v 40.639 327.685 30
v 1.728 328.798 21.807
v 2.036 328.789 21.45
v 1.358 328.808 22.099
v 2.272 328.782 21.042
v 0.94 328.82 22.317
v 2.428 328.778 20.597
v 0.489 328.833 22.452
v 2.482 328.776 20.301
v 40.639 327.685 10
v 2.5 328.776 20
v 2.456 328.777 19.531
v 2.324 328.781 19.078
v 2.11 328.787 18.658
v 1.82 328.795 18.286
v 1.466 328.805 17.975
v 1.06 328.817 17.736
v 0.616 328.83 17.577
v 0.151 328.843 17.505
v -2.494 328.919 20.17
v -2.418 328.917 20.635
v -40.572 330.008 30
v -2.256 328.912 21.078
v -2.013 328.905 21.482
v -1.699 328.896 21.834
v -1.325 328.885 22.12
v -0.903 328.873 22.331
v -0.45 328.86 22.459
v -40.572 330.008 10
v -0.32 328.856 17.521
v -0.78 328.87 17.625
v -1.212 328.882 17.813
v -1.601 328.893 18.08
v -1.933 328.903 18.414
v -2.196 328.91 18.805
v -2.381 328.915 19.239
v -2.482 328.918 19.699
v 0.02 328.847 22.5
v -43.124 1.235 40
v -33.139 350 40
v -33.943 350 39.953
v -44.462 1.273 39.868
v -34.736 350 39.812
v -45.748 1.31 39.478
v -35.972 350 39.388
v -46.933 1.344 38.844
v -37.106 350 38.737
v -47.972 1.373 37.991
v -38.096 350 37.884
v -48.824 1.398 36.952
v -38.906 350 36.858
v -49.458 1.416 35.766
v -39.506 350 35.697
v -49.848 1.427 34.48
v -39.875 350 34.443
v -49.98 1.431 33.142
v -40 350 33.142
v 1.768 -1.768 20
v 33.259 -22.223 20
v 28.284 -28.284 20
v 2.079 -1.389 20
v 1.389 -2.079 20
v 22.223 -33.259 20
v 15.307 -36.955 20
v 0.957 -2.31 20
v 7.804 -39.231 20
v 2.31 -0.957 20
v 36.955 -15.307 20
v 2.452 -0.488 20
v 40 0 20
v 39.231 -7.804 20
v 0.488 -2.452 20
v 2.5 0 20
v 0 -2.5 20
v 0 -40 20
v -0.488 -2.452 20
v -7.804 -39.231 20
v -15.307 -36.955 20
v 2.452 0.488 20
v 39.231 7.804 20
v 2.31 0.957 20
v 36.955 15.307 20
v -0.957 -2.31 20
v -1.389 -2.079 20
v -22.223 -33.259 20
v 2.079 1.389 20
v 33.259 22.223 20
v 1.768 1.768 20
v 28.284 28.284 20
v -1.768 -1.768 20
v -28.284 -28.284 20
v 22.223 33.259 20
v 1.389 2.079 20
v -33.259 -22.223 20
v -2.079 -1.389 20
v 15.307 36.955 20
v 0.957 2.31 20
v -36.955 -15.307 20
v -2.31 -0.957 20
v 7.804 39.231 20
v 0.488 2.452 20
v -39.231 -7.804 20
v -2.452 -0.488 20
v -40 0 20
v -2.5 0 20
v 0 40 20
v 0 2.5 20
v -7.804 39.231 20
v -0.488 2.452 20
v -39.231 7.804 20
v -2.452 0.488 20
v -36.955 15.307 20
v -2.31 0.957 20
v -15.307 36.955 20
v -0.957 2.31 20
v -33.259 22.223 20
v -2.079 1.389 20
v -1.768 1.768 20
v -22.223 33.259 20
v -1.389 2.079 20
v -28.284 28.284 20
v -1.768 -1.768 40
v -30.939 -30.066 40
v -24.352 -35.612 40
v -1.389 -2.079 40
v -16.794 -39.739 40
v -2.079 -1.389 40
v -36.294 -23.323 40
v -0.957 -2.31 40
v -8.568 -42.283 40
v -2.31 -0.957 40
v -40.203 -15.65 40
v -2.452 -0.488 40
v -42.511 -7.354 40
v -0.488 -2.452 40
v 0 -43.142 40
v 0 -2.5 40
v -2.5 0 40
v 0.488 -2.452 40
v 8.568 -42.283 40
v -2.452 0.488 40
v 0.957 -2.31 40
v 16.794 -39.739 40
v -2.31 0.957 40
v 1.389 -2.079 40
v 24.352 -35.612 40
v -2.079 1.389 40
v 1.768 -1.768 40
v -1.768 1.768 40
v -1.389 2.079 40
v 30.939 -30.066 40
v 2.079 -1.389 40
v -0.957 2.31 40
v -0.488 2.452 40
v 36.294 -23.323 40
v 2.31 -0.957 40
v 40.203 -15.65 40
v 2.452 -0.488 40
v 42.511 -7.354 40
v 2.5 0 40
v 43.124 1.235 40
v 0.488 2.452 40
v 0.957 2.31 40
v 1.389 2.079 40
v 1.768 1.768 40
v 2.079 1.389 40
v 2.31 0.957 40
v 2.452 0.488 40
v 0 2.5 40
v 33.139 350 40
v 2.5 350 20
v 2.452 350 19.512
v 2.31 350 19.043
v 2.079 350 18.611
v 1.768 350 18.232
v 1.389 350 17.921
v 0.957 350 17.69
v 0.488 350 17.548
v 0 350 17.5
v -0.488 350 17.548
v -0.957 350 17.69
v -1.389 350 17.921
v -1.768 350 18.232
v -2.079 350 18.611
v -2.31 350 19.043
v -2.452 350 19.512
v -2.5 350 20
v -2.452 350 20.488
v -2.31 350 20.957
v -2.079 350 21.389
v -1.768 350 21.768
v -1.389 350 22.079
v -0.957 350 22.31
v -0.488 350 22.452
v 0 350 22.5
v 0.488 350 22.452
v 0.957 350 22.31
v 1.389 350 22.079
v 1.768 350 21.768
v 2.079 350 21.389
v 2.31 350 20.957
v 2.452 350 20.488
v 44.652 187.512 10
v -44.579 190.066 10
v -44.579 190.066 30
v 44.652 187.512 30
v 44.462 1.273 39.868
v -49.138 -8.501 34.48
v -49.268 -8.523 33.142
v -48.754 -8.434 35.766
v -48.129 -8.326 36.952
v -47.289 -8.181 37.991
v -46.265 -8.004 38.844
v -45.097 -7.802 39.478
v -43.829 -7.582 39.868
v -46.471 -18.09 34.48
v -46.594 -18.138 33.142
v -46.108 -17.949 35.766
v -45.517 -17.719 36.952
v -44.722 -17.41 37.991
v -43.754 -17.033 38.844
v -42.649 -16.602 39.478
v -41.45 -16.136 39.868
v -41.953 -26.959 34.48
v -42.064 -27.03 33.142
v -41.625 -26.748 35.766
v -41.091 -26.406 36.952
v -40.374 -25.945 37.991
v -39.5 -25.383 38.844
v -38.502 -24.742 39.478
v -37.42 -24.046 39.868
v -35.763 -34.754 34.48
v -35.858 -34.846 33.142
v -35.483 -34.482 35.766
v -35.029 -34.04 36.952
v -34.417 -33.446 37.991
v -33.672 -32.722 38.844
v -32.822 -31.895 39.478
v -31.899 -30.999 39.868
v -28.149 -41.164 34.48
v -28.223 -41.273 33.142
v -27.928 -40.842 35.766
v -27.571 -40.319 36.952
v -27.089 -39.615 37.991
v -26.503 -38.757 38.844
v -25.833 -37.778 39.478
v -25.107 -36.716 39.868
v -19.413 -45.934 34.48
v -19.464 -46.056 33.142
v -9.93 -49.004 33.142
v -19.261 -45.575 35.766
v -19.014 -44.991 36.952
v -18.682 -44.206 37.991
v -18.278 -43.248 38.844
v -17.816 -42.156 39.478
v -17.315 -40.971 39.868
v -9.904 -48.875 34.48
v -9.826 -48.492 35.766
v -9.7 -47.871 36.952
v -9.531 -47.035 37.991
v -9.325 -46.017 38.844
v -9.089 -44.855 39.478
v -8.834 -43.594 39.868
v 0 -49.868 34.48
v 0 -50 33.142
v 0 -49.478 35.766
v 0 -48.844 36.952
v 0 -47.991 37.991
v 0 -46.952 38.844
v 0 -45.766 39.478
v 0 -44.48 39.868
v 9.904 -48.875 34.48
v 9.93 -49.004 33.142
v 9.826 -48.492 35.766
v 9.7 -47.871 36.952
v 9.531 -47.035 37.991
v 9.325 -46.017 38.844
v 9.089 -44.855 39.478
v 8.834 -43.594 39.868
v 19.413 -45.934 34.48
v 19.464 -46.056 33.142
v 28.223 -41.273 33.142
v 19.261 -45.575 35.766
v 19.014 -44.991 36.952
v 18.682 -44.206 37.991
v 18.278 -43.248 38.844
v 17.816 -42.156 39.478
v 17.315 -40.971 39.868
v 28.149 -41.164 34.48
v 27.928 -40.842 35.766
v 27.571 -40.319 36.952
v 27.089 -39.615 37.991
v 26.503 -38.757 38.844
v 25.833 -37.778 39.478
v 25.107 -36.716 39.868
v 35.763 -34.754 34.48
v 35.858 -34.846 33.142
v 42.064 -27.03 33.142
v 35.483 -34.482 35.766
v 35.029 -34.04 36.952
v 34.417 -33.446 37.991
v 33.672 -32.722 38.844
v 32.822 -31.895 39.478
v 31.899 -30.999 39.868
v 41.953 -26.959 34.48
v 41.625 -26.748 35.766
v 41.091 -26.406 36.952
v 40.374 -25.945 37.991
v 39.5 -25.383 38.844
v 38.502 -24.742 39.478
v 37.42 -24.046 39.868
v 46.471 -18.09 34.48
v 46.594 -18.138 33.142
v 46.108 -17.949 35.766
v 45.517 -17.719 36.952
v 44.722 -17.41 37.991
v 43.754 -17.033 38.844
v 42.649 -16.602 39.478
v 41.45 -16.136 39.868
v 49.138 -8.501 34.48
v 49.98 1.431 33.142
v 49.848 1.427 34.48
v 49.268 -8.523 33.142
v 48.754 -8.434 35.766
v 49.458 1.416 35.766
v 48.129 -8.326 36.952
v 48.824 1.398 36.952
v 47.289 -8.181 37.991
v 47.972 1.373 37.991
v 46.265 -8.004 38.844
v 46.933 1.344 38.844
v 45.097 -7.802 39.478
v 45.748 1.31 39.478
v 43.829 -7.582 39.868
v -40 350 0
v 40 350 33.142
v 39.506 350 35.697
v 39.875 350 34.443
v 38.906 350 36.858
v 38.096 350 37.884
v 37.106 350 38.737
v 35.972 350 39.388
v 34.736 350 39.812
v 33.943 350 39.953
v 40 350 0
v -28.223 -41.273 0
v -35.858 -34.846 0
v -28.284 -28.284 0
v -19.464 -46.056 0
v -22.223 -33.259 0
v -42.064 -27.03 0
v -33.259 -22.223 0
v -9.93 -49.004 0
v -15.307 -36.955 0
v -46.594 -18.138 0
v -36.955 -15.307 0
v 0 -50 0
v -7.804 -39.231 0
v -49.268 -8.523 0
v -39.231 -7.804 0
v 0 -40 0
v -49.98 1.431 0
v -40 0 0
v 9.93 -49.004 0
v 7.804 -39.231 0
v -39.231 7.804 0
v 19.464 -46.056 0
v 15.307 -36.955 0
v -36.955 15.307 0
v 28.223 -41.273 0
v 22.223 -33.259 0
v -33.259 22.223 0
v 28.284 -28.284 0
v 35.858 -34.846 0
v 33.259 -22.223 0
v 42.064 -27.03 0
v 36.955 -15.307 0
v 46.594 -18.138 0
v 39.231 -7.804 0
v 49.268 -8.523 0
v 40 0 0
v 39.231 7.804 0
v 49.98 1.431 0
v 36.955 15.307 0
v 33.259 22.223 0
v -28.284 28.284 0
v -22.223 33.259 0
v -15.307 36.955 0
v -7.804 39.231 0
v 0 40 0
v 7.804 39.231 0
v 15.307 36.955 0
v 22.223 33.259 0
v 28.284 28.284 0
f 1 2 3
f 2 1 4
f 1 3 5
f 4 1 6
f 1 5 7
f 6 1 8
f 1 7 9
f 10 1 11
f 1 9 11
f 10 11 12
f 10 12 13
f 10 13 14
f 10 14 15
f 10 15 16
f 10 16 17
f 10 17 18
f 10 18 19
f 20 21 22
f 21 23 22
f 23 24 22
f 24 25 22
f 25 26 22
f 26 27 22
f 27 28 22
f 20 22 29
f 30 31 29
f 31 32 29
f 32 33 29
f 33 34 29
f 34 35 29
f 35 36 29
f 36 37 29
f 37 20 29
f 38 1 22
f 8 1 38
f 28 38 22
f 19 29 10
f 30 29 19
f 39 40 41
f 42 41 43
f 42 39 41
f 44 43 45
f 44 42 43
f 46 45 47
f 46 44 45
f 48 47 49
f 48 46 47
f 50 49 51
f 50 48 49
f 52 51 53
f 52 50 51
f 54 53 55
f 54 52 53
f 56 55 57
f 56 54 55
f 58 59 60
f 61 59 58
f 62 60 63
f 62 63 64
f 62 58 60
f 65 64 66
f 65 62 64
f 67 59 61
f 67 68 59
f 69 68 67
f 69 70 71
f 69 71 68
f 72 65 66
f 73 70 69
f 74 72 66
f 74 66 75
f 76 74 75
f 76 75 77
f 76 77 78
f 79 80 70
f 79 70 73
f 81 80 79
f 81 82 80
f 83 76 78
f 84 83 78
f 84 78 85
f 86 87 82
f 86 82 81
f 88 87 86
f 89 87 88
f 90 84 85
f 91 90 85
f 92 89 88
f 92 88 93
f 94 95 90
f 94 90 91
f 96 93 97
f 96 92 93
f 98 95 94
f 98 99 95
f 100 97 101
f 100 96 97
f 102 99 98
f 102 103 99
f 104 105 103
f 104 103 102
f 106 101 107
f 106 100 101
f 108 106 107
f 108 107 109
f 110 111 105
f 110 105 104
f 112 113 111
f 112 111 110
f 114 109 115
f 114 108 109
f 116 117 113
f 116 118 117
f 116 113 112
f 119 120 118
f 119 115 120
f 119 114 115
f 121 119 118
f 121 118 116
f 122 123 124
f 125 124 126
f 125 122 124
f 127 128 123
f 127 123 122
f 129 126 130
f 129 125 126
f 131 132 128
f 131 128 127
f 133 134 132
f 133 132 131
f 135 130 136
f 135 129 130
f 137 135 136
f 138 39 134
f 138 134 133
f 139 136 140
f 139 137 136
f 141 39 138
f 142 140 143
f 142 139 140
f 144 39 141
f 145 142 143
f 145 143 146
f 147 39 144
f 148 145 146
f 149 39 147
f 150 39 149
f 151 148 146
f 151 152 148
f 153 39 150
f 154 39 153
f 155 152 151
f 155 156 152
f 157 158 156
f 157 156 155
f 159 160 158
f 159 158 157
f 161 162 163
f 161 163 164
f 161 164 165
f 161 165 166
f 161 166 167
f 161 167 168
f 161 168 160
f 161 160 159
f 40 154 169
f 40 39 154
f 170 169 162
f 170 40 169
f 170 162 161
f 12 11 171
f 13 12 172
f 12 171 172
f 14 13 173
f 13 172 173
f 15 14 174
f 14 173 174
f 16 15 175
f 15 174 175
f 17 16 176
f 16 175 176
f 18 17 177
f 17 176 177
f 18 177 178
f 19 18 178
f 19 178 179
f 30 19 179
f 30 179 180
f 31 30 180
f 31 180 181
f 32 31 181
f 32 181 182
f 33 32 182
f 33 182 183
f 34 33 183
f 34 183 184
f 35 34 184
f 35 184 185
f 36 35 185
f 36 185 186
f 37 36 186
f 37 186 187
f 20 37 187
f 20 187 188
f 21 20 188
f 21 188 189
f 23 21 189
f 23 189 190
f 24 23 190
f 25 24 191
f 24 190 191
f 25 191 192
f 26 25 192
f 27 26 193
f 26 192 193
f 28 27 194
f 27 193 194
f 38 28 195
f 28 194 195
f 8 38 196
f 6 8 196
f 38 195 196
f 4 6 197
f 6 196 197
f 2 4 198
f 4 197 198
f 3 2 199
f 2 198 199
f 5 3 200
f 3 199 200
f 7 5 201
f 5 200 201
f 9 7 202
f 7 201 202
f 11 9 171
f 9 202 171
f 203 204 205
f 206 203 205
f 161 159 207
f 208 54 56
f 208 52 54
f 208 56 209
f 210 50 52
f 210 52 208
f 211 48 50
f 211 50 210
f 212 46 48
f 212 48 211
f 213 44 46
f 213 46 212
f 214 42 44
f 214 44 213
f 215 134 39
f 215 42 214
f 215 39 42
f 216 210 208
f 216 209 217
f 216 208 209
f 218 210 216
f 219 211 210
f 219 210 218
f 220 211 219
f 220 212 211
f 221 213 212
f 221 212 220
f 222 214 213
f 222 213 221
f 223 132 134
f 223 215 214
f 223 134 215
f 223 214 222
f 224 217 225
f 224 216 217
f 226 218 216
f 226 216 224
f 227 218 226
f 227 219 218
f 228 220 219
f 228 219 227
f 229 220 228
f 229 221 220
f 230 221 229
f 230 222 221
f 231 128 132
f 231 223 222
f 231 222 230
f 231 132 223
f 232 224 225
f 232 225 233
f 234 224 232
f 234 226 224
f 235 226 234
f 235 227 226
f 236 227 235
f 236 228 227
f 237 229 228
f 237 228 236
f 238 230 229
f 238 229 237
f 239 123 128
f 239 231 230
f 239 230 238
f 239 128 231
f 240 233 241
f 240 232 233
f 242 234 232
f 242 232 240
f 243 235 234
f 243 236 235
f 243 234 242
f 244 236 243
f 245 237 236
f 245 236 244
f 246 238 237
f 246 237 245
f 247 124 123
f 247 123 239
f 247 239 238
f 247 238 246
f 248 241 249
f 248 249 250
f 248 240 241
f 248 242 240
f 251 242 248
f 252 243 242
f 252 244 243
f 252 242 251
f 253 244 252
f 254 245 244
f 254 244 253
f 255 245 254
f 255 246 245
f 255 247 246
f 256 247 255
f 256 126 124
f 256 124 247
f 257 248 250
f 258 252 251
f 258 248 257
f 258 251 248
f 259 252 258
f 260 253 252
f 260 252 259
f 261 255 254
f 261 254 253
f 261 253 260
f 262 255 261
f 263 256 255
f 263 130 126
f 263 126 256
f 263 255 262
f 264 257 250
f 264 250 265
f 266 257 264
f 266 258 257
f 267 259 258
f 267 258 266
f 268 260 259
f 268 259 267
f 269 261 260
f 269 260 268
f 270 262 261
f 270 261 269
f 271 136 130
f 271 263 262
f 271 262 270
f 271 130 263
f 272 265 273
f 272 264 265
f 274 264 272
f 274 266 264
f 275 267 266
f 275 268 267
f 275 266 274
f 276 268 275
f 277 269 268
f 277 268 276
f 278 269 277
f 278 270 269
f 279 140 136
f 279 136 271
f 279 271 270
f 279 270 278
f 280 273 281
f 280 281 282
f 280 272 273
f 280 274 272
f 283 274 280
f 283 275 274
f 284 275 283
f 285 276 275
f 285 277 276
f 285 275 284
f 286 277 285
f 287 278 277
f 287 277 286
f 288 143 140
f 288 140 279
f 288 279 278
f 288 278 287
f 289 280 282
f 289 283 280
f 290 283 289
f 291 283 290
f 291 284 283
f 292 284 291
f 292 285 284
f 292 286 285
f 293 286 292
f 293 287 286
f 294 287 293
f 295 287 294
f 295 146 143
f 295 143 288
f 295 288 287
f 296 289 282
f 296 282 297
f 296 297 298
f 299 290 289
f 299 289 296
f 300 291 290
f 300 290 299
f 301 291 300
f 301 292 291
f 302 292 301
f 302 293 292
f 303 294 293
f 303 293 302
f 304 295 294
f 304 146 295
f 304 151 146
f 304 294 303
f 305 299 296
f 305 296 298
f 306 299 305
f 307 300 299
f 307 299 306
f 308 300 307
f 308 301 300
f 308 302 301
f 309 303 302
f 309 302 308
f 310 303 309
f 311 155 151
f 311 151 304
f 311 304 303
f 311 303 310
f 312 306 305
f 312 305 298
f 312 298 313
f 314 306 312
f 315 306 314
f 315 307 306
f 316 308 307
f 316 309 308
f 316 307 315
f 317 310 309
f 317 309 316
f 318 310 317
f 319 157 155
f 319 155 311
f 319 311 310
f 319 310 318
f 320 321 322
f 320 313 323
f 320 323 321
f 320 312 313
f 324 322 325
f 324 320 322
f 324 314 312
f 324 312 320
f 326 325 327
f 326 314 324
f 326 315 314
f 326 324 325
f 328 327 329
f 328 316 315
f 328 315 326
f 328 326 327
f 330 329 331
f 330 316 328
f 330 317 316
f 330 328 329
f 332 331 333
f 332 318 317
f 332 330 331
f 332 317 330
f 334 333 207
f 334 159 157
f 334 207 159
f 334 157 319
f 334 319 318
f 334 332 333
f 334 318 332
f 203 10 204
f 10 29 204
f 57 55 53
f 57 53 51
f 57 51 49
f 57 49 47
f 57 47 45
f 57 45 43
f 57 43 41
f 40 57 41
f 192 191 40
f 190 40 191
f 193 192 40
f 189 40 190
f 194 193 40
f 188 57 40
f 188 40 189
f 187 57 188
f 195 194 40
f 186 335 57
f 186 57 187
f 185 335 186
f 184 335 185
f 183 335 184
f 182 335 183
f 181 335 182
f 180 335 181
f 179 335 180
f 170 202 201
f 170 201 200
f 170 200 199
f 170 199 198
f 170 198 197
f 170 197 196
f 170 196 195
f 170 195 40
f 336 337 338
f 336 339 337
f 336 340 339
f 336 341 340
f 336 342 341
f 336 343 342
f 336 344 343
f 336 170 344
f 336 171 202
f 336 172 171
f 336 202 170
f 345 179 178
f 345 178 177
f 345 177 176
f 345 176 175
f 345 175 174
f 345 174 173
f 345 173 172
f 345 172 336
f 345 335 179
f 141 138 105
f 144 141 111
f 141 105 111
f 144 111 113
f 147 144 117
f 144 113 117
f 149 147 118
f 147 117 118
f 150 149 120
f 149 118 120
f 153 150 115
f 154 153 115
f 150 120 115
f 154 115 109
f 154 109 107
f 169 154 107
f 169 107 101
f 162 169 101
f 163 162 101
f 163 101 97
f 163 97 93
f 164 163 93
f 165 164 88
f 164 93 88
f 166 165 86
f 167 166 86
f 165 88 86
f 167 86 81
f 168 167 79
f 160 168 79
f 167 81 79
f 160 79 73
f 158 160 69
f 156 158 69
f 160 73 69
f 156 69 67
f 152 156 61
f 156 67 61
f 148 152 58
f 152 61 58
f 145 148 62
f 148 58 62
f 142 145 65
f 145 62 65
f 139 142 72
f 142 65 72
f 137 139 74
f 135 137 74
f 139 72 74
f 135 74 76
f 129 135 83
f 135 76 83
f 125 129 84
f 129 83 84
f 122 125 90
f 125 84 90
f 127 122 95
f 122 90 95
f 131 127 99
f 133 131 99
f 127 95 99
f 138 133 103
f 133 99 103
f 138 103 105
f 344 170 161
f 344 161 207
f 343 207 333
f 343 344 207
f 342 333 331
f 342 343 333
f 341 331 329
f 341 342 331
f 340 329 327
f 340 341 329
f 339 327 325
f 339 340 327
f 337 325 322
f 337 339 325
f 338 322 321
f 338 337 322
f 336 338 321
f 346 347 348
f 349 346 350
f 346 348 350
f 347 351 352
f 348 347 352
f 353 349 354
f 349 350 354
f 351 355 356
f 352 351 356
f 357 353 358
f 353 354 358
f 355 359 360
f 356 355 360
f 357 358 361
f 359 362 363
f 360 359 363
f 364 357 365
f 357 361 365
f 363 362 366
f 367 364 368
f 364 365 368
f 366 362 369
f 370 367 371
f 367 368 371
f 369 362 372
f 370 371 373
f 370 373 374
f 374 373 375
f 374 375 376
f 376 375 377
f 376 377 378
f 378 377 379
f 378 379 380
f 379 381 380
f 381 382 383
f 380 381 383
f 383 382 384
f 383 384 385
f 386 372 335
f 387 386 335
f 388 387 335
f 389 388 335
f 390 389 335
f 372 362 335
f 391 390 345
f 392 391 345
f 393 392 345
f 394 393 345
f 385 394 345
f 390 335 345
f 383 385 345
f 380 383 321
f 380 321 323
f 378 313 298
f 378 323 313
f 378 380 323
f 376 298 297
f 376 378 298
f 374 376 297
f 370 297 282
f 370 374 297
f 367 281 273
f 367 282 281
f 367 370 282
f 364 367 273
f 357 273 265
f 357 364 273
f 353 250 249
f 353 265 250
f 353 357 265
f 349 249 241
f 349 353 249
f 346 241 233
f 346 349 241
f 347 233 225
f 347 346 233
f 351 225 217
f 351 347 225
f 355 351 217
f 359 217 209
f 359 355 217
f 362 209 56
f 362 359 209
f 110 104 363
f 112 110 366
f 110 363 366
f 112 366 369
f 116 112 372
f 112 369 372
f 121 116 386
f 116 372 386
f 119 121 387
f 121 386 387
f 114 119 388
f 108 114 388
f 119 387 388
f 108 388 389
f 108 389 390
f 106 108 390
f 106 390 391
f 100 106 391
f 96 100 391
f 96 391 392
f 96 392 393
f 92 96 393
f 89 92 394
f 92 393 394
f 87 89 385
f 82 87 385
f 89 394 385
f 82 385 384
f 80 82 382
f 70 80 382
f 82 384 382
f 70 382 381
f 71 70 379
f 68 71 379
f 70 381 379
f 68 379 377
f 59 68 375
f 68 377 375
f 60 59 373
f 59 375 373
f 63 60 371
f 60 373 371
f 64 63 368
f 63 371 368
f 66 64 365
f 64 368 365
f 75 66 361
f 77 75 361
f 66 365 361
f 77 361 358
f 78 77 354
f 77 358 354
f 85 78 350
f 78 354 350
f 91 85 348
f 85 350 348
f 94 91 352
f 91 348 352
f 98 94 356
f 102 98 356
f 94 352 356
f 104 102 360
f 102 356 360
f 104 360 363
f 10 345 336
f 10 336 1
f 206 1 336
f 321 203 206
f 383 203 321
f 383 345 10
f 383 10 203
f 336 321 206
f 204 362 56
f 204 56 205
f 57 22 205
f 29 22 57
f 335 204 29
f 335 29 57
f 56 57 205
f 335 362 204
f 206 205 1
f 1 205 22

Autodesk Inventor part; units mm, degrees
ref_plane "YZ Plane" through (0, 0, 0) normal (1, 0, 0) x (0, 1, 0)
ref_plane "XZ Plane" through (0, 0, 0) normal (0, 1, 0) x (-1, 0, 0)
sketch "Sketch1" plane through (0, 0, 0) normal (0, 0, 1) x (1, 0, 0)
  arc A0 (-49.9795, 1.4309) -> (49.9795, 1.4309) centre (0, 0) ccw
  line L0 (-49.9795, 1.4309) -> (-40, 350)
  line L1 (-40, 350) -> (40, 350)
  line L2 (40, 350) -> (49.9795, 1.4309)
  point P0 (0, 350)
  dimension "d0" = 100
  dimension "d1" = 350
  dimension "d2" = 80
extrude "Extrusion1" add sketch "Sketch1" along normal blind 40
sketch "Sketch2" plane through (0, 0, 0) normal (0, 0, -1) x (-1, 0, 0)
  circle A0 centre (0, 0) radius 40
  dimension "d5" = 80
extrude "Extrusion2" cut sketch "Sketch2" against normal blind 20
sketch "Sketch3" plane through (0, 0, 20) normal (0, 0, -1) x (-1, 0, 0)
  circle A0 centre (0, 0) radius 2.5
  dimension "d8" = 5
extrude "Extrusion3" cut sketch "Sketch3" against normal blind 20
sketch "Sketch4" plane through (40, 350, 40) normal (0.9996, 0.0286, 0) x (0, 0, -1)
  point P0 (40, -348.7119)
ref_plane "Work Plane1" through (-49.9795, 1.4309, 0) normal (-0.9996, 0.0286, 0) x (-0.0286, -0.9996, 0)
sketch "Sketch5" plane through (-49.9795, 1.4309, 0) normal (-0.9996, 0.0286, 0) x (-0.0286, -0.9996, 0)
  point P0 (0, 0)
sketch "Sketch6" plane through (-49.9795, 1.4309, 0) normal (-0.9996, 0.0286, 0) x (-0.0286, -0.9996, 0)
  line L0 (0, -8) -> (0, 48) projected
  line L1 (-348.7119, 40) -> (0, 40) projected
  line L2 (-348.7119, 0) -> (0, 0) projected
  line L3 (-188.7119, 30) -> (-328.7119, 30)
  line L4 (-328.7119, 30) -> (-328.7119, 10)
  line L5 (-328.7119, 10) -> (-188.7119, 10)
  line L6 (-188.7119, 10) -> (-188.7119, 30)
  line L7 (-348.7119, 0) -> (-348.7119, 40) projected
  point P0 (-348.7119, 20)
  point P1 (-328.7119, 20)
  dimension "d12" = 20
  dimension "d13" = 20
  dimension "d14" = 140
  dimension "d15" = 20
extrude "Extrusion4" cut sketch "Sketch6" against normal through all contours L6 L5 L4 L3
sketch "Sketch7" plane through (-40, 350, 0) normal (0, 1, 0) x (1, 0, 0)
  line L0 (0, -20) -> (80, -20) projected
  circle A0 centre (40, -20) radius 2.5
  point P0 (40, 0)
  dimension "d18" = 5
extrude "Extrusion5" cut sketch "Sketch7" against normal blind 30
fillet "Fillet1" radius 6.858 3 edges at (0, -50, 40) (44.9898, 175.7155, 40) (-44.9898, 175.7155, 40)
properties part number "Robot_arm_2"
